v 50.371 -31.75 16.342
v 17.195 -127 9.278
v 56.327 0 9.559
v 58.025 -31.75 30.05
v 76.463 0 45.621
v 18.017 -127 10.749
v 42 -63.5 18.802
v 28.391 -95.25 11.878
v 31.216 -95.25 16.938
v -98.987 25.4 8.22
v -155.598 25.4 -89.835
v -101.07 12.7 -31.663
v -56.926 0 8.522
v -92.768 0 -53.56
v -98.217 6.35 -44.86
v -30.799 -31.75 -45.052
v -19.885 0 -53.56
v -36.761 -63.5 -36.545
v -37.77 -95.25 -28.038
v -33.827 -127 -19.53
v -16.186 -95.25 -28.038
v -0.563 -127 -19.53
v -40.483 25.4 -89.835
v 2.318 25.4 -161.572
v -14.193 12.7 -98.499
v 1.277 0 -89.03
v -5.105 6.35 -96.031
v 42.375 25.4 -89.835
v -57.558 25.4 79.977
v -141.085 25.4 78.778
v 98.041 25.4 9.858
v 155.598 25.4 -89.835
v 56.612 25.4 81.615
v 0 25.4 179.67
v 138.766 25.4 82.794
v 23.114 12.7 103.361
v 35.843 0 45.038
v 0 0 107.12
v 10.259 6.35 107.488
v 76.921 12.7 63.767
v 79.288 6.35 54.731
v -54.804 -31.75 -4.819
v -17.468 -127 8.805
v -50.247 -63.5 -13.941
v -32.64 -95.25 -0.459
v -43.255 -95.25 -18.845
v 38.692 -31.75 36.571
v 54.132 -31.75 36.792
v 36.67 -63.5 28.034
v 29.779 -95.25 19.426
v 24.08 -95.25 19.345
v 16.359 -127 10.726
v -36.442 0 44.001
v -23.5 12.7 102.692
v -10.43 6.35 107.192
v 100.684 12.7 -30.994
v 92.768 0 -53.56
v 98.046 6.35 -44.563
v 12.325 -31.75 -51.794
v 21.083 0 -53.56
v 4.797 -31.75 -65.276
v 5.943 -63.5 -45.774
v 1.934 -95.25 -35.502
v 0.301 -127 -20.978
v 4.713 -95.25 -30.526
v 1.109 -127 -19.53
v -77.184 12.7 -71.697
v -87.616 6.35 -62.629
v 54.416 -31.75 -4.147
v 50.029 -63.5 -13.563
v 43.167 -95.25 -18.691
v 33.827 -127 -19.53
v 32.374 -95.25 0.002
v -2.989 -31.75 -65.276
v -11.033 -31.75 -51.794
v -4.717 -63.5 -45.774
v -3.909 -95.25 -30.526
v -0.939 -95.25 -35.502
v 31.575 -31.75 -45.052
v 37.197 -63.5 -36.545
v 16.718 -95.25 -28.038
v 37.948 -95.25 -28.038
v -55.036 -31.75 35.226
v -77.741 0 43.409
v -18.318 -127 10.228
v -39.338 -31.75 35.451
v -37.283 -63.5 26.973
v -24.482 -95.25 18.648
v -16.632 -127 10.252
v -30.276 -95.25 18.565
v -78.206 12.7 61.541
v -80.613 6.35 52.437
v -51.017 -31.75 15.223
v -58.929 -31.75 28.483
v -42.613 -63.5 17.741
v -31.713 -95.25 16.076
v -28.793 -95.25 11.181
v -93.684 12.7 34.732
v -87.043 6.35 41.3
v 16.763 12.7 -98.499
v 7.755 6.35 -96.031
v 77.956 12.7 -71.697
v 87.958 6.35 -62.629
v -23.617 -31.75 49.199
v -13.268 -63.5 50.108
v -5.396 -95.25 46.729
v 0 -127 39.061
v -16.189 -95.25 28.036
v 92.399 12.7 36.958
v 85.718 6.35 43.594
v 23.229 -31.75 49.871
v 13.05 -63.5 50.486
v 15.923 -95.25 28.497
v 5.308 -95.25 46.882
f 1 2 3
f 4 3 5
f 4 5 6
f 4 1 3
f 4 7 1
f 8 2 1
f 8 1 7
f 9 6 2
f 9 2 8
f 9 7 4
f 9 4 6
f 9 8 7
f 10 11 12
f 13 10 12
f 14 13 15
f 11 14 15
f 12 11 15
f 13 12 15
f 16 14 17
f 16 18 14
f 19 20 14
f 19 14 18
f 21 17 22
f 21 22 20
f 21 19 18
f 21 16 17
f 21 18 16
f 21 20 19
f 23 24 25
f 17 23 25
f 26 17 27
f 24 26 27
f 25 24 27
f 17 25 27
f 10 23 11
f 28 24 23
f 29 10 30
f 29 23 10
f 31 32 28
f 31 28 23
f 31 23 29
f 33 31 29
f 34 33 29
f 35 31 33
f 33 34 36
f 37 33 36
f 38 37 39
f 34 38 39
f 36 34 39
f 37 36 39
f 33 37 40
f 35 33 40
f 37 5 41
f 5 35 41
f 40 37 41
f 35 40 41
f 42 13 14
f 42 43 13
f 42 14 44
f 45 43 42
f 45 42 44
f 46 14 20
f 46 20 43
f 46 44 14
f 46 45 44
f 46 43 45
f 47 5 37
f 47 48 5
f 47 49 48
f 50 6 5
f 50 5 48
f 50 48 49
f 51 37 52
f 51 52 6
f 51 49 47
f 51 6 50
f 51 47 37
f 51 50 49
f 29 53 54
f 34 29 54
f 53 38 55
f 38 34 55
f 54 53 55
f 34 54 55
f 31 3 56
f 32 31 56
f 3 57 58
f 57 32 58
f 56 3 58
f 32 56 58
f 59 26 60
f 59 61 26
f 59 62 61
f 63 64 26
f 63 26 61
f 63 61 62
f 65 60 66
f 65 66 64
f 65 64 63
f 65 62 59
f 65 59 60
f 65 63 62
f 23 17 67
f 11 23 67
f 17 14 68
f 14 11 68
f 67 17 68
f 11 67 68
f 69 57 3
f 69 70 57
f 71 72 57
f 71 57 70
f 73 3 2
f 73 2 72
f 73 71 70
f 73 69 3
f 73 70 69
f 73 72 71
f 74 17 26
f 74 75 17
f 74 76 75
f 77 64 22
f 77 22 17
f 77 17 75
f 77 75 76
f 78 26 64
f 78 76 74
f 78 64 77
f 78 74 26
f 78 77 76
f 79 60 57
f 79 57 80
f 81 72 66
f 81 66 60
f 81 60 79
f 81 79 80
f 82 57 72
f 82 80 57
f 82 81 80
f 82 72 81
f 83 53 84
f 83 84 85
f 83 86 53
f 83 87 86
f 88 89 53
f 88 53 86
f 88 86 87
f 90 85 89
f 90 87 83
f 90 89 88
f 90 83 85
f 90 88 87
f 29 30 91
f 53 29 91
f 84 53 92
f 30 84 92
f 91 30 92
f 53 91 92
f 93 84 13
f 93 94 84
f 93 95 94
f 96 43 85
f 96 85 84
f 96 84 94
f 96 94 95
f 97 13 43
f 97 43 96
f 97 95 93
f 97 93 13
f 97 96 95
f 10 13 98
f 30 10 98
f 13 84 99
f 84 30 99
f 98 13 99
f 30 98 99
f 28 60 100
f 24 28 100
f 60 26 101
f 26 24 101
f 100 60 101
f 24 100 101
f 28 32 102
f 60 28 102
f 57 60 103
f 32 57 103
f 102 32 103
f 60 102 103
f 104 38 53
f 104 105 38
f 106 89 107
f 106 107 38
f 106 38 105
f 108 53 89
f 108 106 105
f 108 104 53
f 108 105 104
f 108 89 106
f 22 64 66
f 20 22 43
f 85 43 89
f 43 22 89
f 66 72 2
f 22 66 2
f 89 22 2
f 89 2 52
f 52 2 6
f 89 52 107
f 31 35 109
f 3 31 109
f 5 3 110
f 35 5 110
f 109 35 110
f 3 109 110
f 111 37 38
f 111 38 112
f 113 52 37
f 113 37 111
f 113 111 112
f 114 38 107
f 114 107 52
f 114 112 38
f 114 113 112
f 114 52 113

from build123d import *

# Parameters (mm, degrees)
F2_DEPTH      = 127
F2_TAPER      = 15
F2_DEPTH_BACK = 25.4
F2_TAPER_BACK = -55


with BuildPart() as f2:
    # F1 (on Front) → F2 (new body, two sides)
    with BuildSketch(Plane.XZ) as f2_sk:
        Polygon((-19.8853383325, -53.5598434508), (1.2774319094, -89.0296842607), (21.0829494852, -53.5598434508), align=None)
        Polygon((-92.7683701022, -53.5598434508), (-19.8853383325, -53.5598434508), (-56.9256597937, 8.5215518845), align=None)
        Polygon((-56.9256597937, 8.5215518845), (-19.8853383325, -53.5598434508), (21.0829494852, -53.5598434508), (56.3268542174, 9.5587135666), (35.8427103085, 45.0382915663), (-36.4415158848, 44.0011298842), align=None)
        Polygon((56.3268542174, 9.5587135666), (21.0829494852, -53.5598434508), (92.7683701022, -53.5598434508), align=None)
        Polygon((-77.7406842154, 43.4085536452), (-56.9256597937, 8.5215518845), (-36.4415158848, 44.0011298842), align=None)
        Polygon((35.8427103085, 45.0382915663), (56.3268542174, 9.5587135666), (76.463252306, 45.6211306155), align=None)
        Polygon((0, 107.1196869016), (-36.4415158848, 44.0011298842), (35.8427103085, 45.0382915663), align=None)
    extrude(amount=F2_DEPTH, taper=F2_TAPER)
    extrude(f2_sk.sketch, amount=-F2_DEPTH_BACK, taper=F2_TAPER_BACK)


solid = f2.part
